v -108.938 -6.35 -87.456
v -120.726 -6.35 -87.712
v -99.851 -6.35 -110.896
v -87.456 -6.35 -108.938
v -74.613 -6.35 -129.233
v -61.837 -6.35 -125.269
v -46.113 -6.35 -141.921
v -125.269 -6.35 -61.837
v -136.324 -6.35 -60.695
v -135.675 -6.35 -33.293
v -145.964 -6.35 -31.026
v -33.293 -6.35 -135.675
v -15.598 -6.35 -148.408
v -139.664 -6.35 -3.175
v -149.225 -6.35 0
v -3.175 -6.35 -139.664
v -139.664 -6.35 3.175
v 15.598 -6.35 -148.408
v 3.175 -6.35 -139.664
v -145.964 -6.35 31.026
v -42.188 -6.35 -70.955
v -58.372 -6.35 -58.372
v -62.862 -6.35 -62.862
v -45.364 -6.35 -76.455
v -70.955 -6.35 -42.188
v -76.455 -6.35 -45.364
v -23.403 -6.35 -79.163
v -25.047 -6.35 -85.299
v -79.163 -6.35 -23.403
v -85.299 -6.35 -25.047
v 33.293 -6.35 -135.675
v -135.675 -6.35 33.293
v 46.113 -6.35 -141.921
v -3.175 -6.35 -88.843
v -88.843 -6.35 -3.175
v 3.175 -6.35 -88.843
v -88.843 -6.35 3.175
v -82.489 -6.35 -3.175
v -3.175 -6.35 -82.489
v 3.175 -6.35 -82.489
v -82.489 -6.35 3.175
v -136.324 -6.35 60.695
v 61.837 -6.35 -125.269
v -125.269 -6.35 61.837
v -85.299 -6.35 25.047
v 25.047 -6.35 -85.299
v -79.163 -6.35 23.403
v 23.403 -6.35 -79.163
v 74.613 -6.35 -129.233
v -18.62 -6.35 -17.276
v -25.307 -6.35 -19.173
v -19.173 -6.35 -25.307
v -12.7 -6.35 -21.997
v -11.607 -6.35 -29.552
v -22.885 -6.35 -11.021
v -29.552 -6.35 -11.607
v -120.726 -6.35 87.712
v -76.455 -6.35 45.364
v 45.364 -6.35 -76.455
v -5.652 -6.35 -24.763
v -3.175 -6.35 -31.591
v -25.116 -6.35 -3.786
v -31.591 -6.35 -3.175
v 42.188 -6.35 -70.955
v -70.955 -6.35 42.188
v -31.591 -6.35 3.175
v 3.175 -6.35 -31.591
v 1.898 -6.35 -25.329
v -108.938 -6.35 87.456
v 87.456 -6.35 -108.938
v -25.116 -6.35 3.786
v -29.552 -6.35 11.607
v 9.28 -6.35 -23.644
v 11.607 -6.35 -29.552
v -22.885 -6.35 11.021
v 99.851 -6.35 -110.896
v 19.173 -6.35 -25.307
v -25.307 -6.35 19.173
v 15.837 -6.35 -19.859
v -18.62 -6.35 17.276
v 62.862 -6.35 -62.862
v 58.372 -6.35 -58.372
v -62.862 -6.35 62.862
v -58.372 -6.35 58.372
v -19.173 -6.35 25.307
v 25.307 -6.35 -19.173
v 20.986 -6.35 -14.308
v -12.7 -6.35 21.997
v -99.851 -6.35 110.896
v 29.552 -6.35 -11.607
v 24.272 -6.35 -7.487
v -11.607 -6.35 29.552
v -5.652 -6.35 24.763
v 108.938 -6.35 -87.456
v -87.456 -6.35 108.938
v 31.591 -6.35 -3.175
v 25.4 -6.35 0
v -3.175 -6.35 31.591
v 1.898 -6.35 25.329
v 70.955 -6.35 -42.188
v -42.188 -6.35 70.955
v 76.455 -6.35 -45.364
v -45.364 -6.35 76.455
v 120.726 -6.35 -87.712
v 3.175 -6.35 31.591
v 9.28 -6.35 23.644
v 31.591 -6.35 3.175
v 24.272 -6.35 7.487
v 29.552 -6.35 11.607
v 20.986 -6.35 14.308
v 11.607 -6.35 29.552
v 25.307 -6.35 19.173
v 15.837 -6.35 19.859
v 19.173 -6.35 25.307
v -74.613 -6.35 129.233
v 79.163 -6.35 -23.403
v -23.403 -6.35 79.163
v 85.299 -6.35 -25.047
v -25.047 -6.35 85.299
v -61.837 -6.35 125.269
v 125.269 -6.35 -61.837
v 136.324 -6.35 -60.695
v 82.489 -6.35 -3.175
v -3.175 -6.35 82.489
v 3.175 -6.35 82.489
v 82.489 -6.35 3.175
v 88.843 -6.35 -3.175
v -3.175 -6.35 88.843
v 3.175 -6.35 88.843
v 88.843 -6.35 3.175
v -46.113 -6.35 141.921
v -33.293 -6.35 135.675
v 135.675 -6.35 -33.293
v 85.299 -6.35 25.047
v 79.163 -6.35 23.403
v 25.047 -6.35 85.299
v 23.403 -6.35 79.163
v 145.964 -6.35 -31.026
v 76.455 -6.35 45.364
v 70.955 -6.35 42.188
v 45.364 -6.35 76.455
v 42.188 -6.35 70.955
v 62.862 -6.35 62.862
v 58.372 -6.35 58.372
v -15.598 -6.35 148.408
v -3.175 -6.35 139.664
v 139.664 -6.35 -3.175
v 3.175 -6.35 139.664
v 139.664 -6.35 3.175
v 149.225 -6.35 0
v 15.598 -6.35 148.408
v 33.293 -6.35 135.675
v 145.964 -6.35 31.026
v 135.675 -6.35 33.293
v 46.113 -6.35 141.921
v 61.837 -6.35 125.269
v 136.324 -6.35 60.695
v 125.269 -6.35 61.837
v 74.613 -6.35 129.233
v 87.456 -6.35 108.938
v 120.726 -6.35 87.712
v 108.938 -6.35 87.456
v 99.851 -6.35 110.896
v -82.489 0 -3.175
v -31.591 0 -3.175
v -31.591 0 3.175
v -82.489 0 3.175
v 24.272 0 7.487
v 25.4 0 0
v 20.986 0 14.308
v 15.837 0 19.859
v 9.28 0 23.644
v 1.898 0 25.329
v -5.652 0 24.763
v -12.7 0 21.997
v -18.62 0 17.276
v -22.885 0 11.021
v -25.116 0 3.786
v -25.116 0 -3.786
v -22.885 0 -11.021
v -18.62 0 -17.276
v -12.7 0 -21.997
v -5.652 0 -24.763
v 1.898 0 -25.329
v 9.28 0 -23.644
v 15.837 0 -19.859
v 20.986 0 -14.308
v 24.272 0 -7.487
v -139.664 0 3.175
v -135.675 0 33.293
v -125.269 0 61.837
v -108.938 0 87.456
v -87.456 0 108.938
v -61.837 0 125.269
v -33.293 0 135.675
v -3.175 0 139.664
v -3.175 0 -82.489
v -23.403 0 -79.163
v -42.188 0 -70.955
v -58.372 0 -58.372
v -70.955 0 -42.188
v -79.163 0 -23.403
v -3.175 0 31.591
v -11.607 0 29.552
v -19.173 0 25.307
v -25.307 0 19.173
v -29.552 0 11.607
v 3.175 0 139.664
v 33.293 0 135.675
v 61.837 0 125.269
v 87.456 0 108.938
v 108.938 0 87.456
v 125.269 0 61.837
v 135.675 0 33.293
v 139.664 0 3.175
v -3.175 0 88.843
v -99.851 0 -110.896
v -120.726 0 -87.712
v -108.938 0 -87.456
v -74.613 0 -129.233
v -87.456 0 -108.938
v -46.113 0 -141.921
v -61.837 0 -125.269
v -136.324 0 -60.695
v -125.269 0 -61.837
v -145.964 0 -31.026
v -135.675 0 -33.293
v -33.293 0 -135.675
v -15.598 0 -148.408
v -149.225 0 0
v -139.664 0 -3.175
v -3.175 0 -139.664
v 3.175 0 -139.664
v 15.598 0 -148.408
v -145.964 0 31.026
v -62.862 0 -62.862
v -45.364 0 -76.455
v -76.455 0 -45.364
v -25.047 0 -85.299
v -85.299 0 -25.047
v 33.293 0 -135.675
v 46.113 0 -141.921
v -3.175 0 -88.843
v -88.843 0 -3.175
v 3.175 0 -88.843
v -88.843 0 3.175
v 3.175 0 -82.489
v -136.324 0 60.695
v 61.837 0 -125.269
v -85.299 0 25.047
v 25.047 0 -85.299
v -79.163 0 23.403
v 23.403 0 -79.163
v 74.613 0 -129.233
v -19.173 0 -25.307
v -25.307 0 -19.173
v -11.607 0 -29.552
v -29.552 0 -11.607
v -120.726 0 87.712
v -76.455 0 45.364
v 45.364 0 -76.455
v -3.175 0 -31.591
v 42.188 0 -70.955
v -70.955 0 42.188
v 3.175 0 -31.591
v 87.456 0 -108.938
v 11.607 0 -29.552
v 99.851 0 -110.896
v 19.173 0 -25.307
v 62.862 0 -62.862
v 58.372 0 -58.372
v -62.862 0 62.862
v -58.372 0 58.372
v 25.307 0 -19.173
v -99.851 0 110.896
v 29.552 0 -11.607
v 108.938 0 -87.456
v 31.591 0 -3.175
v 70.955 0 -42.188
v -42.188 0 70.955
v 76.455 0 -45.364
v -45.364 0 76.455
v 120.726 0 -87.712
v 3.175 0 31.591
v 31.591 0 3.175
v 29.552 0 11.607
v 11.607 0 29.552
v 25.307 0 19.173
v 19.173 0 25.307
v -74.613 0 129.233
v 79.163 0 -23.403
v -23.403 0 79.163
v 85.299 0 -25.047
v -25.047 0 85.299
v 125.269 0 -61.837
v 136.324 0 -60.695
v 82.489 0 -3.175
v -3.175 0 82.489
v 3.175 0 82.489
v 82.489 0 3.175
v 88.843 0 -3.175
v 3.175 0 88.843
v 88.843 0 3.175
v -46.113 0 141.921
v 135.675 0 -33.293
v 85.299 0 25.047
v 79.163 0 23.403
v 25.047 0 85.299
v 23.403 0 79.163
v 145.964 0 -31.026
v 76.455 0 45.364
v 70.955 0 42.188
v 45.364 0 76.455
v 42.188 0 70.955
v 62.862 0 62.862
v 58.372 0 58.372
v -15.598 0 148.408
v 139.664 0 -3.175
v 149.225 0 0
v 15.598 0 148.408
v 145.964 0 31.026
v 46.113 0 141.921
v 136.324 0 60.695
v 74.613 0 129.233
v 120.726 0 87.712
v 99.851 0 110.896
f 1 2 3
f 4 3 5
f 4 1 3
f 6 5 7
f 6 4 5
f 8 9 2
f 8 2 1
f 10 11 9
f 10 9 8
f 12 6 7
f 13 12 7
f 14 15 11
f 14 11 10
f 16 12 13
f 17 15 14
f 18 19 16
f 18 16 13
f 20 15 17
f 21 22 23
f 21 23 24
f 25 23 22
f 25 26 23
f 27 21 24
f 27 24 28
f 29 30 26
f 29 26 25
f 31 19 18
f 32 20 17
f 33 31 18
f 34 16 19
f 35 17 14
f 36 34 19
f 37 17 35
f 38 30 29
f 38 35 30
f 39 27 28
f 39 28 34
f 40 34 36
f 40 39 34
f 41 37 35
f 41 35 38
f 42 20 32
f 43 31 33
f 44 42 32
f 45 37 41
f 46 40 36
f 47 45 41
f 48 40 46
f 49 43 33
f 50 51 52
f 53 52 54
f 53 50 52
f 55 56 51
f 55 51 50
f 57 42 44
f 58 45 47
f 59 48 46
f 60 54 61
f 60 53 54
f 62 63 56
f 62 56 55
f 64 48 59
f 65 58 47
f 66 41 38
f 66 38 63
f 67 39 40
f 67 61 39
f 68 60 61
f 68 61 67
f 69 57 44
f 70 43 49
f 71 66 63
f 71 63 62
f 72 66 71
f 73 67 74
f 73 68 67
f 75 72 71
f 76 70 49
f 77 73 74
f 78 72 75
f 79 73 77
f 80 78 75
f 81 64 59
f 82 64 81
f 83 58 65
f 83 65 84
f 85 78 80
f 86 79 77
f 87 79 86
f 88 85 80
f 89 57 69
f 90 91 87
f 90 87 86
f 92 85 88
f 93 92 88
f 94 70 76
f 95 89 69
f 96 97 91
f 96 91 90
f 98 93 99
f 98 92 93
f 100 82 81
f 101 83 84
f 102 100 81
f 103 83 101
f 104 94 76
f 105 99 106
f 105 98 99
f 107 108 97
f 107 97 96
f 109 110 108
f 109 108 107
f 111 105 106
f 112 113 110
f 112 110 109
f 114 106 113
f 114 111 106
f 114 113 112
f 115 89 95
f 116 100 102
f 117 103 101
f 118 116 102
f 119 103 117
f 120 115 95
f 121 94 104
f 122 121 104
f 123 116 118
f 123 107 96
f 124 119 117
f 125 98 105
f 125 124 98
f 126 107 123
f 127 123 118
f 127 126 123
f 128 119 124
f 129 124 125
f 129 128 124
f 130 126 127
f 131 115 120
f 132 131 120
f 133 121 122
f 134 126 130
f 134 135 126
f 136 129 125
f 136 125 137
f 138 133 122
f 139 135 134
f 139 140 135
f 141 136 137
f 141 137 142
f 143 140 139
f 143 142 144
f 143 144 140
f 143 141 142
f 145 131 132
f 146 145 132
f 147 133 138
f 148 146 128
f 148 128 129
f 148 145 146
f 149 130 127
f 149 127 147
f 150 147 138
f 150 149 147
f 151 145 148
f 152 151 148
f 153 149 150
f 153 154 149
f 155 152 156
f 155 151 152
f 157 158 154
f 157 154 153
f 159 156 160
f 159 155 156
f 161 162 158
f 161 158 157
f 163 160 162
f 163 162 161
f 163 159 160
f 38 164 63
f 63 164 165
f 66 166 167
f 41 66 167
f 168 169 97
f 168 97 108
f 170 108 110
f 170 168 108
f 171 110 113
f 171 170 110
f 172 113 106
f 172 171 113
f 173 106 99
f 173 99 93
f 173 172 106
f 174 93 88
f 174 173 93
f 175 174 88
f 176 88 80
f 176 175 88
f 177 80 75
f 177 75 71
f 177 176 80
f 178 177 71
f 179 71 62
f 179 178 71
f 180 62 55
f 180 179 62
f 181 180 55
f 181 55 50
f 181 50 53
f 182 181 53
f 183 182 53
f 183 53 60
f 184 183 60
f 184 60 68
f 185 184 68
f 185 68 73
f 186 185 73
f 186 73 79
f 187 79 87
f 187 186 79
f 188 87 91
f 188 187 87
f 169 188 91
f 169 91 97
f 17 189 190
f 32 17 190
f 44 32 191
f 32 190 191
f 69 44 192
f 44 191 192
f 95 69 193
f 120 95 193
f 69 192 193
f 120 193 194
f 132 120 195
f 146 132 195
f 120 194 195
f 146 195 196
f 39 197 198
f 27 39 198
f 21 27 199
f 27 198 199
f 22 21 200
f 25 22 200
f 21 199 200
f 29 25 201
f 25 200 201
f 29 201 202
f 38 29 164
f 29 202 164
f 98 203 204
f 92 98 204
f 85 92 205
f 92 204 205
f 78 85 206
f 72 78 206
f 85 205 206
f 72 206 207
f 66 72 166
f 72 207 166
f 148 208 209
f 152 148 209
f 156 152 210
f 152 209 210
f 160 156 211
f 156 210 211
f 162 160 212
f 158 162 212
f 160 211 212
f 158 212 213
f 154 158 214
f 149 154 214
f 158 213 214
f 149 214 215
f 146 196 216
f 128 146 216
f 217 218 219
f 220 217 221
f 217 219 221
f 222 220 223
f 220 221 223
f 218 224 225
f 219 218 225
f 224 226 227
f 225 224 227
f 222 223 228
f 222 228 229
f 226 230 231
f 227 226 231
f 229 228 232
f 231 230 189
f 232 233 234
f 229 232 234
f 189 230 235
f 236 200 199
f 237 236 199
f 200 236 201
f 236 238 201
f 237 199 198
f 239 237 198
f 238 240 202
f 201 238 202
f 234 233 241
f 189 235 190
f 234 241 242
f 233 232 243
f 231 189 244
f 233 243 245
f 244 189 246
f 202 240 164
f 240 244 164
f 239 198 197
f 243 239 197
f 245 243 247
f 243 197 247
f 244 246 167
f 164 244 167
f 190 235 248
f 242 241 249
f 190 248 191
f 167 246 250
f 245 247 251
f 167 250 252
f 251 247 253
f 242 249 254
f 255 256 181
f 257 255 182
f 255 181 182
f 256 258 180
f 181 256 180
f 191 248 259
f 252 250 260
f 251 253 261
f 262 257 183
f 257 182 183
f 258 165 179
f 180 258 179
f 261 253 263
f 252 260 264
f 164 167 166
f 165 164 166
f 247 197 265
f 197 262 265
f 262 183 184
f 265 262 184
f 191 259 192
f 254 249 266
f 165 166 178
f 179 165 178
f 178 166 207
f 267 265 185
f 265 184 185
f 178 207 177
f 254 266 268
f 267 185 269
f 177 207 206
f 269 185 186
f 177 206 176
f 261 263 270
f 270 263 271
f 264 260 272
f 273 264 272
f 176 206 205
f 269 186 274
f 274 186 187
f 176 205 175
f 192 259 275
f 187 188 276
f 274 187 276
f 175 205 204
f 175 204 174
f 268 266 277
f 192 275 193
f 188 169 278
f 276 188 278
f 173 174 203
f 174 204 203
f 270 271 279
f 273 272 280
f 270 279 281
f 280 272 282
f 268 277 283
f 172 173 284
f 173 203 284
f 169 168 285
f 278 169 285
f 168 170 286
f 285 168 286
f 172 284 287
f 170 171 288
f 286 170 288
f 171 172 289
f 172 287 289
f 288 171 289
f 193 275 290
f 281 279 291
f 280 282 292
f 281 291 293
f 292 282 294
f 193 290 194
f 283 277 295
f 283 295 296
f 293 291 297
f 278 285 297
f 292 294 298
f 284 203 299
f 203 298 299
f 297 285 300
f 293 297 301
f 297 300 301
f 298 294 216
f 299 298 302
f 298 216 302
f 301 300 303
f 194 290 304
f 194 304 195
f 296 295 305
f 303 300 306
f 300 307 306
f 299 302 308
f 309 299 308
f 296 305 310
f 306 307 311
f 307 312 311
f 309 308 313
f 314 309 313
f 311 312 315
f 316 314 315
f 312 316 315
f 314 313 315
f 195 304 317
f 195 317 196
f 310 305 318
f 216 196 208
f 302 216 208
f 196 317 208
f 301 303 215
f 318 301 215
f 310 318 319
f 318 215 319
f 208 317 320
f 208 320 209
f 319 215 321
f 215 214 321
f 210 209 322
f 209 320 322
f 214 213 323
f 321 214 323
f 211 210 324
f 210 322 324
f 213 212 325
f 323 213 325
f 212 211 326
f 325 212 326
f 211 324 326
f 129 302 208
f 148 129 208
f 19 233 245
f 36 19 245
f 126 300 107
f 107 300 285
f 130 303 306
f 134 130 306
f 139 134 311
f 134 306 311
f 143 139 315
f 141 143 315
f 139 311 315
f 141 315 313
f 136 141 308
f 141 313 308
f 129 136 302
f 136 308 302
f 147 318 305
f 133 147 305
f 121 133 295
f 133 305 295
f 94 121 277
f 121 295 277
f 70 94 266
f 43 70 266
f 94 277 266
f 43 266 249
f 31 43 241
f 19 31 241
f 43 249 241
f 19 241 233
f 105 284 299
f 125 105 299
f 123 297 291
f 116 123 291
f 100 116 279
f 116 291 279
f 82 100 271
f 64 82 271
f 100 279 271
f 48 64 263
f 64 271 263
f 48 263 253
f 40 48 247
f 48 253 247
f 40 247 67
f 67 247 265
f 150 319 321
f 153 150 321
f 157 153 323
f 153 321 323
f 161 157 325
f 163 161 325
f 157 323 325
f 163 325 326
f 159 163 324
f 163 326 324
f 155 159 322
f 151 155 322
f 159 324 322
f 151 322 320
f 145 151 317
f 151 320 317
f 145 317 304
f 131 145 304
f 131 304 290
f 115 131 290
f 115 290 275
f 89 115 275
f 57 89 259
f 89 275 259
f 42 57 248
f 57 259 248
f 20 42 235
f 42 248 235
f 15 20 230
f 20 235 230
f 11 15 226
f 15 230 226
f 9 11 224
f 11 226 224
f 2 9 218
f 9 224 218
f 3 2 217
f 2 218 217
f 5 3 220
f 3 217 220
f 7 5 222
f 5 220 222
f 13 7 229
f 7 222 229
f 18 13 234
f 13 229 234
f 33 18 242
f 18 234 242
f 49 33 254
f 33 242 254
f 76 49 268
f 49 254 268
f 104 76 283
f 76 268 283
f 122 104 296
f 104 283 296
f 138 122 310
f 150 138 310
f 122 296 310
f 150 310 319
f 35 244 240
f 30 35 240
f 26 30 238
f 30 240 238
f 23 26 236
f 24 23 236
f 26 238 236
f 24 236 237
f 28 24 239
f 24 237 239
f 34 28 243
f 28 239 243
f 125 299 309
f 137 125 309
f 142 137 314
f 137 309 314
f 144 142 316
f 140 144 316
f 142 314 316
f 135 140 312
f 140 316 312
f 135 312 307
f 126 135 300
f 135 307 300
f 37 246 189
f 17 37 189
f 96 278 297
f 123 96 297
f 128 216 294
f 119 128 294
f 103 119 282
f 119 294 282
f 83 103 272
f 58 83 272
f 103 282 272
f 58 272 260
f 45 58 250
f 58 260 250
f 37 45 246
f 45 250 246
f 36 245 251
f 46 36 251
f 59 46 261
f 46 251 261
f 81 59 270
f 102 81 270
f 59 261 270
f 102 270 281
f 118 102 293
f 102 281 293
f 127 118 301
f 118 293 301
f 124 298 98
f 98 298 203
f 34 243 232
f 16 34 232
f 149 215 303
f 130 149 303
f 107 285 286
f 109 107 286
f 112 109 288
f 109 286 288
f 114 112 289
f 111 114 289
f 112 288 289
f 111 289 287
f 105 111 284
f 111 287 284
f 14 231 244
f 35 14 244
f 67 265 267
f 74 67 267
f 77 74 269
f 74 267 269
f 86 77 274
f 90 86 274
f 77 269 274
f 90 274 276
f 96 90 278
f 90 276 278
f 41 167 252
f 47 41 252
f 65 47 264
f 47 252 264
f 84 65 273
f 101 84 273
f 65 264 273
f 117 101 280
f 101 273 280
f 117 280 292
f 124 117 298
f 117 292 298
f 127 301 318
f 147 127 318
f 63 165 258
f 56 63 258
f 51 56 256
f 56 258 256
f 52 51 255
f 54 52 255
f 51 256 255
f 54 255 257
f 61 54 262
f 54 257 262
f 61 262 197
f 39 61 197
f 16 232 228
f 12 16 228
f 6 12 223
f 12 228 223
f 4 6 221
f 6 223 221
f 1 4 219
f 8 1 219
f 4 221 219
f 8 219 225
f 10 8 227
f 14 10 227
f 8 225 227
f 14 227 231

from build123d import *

# Parameters (mm, degrees)
F0_R     = 149.225
F0_R_2   = 25.399996
F1_DEPTH = 6.35


with BuildPart() as f1:
    # F0 (on Front) → F1 (new body)
    with BuildSketch(Plane.XZ):
        Circle(F0_R)
        with BuildLine():
            ThreePointArc((-3.175, -139.663916), (-98.782817, -98.782817), (-139.663916, -3.175))
            Line((-139.663916, -3.175), (-88.843285, -3.175))
            ThreePointArc((-88.843285, -3.175), (-62.861793, -62.861793), (-3.175, -88.843285))
            Line((-3.175, -88.843285), (-3.175, -139.663916))
        make_face(mode=Mode.SUBTRACT)
        with BuildLine():
            ThreePointArc((-3.175, -82.488916), (-58.371662, -58.371662), (-82.488916, -3.175))
            Line((-82.488916, -3.175), (-31.590848, -3.175))
            ThreePointArc((-31.590848, -3.175), (-22.450638, -22.450638), (-3.175, -31.590848))
            Line((-3.175, -31.590848), (-3.175, -82.488916))
        make_face(mode=Mode.SUBTRACT)
        with BuildLine():
            Line((3.175, -139.663916), (3.175, -88.843285))
            ThreePointArc((3.175, -88.843285), (62.861793, -62.861793), (88.843285, -3.175))
            Line((88.843285, -3.175), (139.663916, -3.175))
            ThreePointArc((139.663916, -3.175), (98.782817, -98.782817), (3.175, -139.663916))
        make_face(mode=Mode.SUBTRACT)
        with BuildLine():
            Line((3.175, -82.488916), (3.175, -31.590848))
            ThreePointArc((3.175, -31.590848), (22.450638, -22.450638), (31.590848, -3.175))
            Line((31.590848, -3.175), (31.749997, -3.175))
            Line((31.749997, -3.175), (82.488916, -3.175))
            ThreePointArc((82.488916, -3.175), (58.371662, -58.371662), (3.175, -82.488916))
        make_face(mode=Mode.SUBTRACT)
        with BuildLine():
            Line((-31.590848, 3.175), (-31.749997, 3.175))
            Line((-31.749997, 3.175), (-82.488916, 3.175))
            ThreePointArc((-82.488916, 3.175), (-58.371662, 58.371662), (-3.175, 82.488916))
            Line((-3.175, 82.488916), (-3.175, 31.749997))
            Line((-3.175, 31.749997), (-3.175, 31.590848))
            ThreePointArc((-3.175, 31.590848), (-22.450638, 22.450638), (-31.590848, 3.175))
        make_face(mode=Mode.SUBTRACT)
        with BuildLine():
            ThreePointArc((-139.663916, 3.175), (-98.782817, 98.782817), (-3.175, 139.663916))
            Line((-3.175, 139.663916), (-3.175, 88.843285))
            ThreePointArc((-3.175, 88.843285), (-62.861793, 62.861793), (-88.843285, 3.175))
            Line((-88.843285, 3.175), (-139.663916, 3.175))
        make_face(mode=Mode.SUBTRACT)
        Circle(F0_R_2, mode=Mode.SUBTRACT)
        with BuildLine():
            Line((3.175, 31.590848), (3.175, 31.749997))
            Line((3.175, 31.749997), (3.175, 82.488916))
            ThreePointArc((3.175, 82.488916), (58.371662, 58.371662), (82.488916, 3.175))
            Line((82.488916, 3.175), (31.590848, 3.175))
            ThreePointArc((31.590848, 3.175), (22.450638, 22.450638), (3.175, 31.590848))
        make_face(mode=Mode.SUBTRACT)
        with BuildLine():
            ThreePointArc((3.175, 139.663916), (98.782817, 98.782817), (139.663916, 3.175))
            Line((139.663916, 3.175), (88.843285, 3.175))
            ThreePointArc((88.843285, 3.175), (62.861793, 62.861793), (3.175, 88.843285))
            Line((3.175, 88.843285), (3.175, 139.663916))
        make_face(mode=Mode.SUBTRACT)
    extrude(amount=F1_DEPTH)


solid = f1.part
